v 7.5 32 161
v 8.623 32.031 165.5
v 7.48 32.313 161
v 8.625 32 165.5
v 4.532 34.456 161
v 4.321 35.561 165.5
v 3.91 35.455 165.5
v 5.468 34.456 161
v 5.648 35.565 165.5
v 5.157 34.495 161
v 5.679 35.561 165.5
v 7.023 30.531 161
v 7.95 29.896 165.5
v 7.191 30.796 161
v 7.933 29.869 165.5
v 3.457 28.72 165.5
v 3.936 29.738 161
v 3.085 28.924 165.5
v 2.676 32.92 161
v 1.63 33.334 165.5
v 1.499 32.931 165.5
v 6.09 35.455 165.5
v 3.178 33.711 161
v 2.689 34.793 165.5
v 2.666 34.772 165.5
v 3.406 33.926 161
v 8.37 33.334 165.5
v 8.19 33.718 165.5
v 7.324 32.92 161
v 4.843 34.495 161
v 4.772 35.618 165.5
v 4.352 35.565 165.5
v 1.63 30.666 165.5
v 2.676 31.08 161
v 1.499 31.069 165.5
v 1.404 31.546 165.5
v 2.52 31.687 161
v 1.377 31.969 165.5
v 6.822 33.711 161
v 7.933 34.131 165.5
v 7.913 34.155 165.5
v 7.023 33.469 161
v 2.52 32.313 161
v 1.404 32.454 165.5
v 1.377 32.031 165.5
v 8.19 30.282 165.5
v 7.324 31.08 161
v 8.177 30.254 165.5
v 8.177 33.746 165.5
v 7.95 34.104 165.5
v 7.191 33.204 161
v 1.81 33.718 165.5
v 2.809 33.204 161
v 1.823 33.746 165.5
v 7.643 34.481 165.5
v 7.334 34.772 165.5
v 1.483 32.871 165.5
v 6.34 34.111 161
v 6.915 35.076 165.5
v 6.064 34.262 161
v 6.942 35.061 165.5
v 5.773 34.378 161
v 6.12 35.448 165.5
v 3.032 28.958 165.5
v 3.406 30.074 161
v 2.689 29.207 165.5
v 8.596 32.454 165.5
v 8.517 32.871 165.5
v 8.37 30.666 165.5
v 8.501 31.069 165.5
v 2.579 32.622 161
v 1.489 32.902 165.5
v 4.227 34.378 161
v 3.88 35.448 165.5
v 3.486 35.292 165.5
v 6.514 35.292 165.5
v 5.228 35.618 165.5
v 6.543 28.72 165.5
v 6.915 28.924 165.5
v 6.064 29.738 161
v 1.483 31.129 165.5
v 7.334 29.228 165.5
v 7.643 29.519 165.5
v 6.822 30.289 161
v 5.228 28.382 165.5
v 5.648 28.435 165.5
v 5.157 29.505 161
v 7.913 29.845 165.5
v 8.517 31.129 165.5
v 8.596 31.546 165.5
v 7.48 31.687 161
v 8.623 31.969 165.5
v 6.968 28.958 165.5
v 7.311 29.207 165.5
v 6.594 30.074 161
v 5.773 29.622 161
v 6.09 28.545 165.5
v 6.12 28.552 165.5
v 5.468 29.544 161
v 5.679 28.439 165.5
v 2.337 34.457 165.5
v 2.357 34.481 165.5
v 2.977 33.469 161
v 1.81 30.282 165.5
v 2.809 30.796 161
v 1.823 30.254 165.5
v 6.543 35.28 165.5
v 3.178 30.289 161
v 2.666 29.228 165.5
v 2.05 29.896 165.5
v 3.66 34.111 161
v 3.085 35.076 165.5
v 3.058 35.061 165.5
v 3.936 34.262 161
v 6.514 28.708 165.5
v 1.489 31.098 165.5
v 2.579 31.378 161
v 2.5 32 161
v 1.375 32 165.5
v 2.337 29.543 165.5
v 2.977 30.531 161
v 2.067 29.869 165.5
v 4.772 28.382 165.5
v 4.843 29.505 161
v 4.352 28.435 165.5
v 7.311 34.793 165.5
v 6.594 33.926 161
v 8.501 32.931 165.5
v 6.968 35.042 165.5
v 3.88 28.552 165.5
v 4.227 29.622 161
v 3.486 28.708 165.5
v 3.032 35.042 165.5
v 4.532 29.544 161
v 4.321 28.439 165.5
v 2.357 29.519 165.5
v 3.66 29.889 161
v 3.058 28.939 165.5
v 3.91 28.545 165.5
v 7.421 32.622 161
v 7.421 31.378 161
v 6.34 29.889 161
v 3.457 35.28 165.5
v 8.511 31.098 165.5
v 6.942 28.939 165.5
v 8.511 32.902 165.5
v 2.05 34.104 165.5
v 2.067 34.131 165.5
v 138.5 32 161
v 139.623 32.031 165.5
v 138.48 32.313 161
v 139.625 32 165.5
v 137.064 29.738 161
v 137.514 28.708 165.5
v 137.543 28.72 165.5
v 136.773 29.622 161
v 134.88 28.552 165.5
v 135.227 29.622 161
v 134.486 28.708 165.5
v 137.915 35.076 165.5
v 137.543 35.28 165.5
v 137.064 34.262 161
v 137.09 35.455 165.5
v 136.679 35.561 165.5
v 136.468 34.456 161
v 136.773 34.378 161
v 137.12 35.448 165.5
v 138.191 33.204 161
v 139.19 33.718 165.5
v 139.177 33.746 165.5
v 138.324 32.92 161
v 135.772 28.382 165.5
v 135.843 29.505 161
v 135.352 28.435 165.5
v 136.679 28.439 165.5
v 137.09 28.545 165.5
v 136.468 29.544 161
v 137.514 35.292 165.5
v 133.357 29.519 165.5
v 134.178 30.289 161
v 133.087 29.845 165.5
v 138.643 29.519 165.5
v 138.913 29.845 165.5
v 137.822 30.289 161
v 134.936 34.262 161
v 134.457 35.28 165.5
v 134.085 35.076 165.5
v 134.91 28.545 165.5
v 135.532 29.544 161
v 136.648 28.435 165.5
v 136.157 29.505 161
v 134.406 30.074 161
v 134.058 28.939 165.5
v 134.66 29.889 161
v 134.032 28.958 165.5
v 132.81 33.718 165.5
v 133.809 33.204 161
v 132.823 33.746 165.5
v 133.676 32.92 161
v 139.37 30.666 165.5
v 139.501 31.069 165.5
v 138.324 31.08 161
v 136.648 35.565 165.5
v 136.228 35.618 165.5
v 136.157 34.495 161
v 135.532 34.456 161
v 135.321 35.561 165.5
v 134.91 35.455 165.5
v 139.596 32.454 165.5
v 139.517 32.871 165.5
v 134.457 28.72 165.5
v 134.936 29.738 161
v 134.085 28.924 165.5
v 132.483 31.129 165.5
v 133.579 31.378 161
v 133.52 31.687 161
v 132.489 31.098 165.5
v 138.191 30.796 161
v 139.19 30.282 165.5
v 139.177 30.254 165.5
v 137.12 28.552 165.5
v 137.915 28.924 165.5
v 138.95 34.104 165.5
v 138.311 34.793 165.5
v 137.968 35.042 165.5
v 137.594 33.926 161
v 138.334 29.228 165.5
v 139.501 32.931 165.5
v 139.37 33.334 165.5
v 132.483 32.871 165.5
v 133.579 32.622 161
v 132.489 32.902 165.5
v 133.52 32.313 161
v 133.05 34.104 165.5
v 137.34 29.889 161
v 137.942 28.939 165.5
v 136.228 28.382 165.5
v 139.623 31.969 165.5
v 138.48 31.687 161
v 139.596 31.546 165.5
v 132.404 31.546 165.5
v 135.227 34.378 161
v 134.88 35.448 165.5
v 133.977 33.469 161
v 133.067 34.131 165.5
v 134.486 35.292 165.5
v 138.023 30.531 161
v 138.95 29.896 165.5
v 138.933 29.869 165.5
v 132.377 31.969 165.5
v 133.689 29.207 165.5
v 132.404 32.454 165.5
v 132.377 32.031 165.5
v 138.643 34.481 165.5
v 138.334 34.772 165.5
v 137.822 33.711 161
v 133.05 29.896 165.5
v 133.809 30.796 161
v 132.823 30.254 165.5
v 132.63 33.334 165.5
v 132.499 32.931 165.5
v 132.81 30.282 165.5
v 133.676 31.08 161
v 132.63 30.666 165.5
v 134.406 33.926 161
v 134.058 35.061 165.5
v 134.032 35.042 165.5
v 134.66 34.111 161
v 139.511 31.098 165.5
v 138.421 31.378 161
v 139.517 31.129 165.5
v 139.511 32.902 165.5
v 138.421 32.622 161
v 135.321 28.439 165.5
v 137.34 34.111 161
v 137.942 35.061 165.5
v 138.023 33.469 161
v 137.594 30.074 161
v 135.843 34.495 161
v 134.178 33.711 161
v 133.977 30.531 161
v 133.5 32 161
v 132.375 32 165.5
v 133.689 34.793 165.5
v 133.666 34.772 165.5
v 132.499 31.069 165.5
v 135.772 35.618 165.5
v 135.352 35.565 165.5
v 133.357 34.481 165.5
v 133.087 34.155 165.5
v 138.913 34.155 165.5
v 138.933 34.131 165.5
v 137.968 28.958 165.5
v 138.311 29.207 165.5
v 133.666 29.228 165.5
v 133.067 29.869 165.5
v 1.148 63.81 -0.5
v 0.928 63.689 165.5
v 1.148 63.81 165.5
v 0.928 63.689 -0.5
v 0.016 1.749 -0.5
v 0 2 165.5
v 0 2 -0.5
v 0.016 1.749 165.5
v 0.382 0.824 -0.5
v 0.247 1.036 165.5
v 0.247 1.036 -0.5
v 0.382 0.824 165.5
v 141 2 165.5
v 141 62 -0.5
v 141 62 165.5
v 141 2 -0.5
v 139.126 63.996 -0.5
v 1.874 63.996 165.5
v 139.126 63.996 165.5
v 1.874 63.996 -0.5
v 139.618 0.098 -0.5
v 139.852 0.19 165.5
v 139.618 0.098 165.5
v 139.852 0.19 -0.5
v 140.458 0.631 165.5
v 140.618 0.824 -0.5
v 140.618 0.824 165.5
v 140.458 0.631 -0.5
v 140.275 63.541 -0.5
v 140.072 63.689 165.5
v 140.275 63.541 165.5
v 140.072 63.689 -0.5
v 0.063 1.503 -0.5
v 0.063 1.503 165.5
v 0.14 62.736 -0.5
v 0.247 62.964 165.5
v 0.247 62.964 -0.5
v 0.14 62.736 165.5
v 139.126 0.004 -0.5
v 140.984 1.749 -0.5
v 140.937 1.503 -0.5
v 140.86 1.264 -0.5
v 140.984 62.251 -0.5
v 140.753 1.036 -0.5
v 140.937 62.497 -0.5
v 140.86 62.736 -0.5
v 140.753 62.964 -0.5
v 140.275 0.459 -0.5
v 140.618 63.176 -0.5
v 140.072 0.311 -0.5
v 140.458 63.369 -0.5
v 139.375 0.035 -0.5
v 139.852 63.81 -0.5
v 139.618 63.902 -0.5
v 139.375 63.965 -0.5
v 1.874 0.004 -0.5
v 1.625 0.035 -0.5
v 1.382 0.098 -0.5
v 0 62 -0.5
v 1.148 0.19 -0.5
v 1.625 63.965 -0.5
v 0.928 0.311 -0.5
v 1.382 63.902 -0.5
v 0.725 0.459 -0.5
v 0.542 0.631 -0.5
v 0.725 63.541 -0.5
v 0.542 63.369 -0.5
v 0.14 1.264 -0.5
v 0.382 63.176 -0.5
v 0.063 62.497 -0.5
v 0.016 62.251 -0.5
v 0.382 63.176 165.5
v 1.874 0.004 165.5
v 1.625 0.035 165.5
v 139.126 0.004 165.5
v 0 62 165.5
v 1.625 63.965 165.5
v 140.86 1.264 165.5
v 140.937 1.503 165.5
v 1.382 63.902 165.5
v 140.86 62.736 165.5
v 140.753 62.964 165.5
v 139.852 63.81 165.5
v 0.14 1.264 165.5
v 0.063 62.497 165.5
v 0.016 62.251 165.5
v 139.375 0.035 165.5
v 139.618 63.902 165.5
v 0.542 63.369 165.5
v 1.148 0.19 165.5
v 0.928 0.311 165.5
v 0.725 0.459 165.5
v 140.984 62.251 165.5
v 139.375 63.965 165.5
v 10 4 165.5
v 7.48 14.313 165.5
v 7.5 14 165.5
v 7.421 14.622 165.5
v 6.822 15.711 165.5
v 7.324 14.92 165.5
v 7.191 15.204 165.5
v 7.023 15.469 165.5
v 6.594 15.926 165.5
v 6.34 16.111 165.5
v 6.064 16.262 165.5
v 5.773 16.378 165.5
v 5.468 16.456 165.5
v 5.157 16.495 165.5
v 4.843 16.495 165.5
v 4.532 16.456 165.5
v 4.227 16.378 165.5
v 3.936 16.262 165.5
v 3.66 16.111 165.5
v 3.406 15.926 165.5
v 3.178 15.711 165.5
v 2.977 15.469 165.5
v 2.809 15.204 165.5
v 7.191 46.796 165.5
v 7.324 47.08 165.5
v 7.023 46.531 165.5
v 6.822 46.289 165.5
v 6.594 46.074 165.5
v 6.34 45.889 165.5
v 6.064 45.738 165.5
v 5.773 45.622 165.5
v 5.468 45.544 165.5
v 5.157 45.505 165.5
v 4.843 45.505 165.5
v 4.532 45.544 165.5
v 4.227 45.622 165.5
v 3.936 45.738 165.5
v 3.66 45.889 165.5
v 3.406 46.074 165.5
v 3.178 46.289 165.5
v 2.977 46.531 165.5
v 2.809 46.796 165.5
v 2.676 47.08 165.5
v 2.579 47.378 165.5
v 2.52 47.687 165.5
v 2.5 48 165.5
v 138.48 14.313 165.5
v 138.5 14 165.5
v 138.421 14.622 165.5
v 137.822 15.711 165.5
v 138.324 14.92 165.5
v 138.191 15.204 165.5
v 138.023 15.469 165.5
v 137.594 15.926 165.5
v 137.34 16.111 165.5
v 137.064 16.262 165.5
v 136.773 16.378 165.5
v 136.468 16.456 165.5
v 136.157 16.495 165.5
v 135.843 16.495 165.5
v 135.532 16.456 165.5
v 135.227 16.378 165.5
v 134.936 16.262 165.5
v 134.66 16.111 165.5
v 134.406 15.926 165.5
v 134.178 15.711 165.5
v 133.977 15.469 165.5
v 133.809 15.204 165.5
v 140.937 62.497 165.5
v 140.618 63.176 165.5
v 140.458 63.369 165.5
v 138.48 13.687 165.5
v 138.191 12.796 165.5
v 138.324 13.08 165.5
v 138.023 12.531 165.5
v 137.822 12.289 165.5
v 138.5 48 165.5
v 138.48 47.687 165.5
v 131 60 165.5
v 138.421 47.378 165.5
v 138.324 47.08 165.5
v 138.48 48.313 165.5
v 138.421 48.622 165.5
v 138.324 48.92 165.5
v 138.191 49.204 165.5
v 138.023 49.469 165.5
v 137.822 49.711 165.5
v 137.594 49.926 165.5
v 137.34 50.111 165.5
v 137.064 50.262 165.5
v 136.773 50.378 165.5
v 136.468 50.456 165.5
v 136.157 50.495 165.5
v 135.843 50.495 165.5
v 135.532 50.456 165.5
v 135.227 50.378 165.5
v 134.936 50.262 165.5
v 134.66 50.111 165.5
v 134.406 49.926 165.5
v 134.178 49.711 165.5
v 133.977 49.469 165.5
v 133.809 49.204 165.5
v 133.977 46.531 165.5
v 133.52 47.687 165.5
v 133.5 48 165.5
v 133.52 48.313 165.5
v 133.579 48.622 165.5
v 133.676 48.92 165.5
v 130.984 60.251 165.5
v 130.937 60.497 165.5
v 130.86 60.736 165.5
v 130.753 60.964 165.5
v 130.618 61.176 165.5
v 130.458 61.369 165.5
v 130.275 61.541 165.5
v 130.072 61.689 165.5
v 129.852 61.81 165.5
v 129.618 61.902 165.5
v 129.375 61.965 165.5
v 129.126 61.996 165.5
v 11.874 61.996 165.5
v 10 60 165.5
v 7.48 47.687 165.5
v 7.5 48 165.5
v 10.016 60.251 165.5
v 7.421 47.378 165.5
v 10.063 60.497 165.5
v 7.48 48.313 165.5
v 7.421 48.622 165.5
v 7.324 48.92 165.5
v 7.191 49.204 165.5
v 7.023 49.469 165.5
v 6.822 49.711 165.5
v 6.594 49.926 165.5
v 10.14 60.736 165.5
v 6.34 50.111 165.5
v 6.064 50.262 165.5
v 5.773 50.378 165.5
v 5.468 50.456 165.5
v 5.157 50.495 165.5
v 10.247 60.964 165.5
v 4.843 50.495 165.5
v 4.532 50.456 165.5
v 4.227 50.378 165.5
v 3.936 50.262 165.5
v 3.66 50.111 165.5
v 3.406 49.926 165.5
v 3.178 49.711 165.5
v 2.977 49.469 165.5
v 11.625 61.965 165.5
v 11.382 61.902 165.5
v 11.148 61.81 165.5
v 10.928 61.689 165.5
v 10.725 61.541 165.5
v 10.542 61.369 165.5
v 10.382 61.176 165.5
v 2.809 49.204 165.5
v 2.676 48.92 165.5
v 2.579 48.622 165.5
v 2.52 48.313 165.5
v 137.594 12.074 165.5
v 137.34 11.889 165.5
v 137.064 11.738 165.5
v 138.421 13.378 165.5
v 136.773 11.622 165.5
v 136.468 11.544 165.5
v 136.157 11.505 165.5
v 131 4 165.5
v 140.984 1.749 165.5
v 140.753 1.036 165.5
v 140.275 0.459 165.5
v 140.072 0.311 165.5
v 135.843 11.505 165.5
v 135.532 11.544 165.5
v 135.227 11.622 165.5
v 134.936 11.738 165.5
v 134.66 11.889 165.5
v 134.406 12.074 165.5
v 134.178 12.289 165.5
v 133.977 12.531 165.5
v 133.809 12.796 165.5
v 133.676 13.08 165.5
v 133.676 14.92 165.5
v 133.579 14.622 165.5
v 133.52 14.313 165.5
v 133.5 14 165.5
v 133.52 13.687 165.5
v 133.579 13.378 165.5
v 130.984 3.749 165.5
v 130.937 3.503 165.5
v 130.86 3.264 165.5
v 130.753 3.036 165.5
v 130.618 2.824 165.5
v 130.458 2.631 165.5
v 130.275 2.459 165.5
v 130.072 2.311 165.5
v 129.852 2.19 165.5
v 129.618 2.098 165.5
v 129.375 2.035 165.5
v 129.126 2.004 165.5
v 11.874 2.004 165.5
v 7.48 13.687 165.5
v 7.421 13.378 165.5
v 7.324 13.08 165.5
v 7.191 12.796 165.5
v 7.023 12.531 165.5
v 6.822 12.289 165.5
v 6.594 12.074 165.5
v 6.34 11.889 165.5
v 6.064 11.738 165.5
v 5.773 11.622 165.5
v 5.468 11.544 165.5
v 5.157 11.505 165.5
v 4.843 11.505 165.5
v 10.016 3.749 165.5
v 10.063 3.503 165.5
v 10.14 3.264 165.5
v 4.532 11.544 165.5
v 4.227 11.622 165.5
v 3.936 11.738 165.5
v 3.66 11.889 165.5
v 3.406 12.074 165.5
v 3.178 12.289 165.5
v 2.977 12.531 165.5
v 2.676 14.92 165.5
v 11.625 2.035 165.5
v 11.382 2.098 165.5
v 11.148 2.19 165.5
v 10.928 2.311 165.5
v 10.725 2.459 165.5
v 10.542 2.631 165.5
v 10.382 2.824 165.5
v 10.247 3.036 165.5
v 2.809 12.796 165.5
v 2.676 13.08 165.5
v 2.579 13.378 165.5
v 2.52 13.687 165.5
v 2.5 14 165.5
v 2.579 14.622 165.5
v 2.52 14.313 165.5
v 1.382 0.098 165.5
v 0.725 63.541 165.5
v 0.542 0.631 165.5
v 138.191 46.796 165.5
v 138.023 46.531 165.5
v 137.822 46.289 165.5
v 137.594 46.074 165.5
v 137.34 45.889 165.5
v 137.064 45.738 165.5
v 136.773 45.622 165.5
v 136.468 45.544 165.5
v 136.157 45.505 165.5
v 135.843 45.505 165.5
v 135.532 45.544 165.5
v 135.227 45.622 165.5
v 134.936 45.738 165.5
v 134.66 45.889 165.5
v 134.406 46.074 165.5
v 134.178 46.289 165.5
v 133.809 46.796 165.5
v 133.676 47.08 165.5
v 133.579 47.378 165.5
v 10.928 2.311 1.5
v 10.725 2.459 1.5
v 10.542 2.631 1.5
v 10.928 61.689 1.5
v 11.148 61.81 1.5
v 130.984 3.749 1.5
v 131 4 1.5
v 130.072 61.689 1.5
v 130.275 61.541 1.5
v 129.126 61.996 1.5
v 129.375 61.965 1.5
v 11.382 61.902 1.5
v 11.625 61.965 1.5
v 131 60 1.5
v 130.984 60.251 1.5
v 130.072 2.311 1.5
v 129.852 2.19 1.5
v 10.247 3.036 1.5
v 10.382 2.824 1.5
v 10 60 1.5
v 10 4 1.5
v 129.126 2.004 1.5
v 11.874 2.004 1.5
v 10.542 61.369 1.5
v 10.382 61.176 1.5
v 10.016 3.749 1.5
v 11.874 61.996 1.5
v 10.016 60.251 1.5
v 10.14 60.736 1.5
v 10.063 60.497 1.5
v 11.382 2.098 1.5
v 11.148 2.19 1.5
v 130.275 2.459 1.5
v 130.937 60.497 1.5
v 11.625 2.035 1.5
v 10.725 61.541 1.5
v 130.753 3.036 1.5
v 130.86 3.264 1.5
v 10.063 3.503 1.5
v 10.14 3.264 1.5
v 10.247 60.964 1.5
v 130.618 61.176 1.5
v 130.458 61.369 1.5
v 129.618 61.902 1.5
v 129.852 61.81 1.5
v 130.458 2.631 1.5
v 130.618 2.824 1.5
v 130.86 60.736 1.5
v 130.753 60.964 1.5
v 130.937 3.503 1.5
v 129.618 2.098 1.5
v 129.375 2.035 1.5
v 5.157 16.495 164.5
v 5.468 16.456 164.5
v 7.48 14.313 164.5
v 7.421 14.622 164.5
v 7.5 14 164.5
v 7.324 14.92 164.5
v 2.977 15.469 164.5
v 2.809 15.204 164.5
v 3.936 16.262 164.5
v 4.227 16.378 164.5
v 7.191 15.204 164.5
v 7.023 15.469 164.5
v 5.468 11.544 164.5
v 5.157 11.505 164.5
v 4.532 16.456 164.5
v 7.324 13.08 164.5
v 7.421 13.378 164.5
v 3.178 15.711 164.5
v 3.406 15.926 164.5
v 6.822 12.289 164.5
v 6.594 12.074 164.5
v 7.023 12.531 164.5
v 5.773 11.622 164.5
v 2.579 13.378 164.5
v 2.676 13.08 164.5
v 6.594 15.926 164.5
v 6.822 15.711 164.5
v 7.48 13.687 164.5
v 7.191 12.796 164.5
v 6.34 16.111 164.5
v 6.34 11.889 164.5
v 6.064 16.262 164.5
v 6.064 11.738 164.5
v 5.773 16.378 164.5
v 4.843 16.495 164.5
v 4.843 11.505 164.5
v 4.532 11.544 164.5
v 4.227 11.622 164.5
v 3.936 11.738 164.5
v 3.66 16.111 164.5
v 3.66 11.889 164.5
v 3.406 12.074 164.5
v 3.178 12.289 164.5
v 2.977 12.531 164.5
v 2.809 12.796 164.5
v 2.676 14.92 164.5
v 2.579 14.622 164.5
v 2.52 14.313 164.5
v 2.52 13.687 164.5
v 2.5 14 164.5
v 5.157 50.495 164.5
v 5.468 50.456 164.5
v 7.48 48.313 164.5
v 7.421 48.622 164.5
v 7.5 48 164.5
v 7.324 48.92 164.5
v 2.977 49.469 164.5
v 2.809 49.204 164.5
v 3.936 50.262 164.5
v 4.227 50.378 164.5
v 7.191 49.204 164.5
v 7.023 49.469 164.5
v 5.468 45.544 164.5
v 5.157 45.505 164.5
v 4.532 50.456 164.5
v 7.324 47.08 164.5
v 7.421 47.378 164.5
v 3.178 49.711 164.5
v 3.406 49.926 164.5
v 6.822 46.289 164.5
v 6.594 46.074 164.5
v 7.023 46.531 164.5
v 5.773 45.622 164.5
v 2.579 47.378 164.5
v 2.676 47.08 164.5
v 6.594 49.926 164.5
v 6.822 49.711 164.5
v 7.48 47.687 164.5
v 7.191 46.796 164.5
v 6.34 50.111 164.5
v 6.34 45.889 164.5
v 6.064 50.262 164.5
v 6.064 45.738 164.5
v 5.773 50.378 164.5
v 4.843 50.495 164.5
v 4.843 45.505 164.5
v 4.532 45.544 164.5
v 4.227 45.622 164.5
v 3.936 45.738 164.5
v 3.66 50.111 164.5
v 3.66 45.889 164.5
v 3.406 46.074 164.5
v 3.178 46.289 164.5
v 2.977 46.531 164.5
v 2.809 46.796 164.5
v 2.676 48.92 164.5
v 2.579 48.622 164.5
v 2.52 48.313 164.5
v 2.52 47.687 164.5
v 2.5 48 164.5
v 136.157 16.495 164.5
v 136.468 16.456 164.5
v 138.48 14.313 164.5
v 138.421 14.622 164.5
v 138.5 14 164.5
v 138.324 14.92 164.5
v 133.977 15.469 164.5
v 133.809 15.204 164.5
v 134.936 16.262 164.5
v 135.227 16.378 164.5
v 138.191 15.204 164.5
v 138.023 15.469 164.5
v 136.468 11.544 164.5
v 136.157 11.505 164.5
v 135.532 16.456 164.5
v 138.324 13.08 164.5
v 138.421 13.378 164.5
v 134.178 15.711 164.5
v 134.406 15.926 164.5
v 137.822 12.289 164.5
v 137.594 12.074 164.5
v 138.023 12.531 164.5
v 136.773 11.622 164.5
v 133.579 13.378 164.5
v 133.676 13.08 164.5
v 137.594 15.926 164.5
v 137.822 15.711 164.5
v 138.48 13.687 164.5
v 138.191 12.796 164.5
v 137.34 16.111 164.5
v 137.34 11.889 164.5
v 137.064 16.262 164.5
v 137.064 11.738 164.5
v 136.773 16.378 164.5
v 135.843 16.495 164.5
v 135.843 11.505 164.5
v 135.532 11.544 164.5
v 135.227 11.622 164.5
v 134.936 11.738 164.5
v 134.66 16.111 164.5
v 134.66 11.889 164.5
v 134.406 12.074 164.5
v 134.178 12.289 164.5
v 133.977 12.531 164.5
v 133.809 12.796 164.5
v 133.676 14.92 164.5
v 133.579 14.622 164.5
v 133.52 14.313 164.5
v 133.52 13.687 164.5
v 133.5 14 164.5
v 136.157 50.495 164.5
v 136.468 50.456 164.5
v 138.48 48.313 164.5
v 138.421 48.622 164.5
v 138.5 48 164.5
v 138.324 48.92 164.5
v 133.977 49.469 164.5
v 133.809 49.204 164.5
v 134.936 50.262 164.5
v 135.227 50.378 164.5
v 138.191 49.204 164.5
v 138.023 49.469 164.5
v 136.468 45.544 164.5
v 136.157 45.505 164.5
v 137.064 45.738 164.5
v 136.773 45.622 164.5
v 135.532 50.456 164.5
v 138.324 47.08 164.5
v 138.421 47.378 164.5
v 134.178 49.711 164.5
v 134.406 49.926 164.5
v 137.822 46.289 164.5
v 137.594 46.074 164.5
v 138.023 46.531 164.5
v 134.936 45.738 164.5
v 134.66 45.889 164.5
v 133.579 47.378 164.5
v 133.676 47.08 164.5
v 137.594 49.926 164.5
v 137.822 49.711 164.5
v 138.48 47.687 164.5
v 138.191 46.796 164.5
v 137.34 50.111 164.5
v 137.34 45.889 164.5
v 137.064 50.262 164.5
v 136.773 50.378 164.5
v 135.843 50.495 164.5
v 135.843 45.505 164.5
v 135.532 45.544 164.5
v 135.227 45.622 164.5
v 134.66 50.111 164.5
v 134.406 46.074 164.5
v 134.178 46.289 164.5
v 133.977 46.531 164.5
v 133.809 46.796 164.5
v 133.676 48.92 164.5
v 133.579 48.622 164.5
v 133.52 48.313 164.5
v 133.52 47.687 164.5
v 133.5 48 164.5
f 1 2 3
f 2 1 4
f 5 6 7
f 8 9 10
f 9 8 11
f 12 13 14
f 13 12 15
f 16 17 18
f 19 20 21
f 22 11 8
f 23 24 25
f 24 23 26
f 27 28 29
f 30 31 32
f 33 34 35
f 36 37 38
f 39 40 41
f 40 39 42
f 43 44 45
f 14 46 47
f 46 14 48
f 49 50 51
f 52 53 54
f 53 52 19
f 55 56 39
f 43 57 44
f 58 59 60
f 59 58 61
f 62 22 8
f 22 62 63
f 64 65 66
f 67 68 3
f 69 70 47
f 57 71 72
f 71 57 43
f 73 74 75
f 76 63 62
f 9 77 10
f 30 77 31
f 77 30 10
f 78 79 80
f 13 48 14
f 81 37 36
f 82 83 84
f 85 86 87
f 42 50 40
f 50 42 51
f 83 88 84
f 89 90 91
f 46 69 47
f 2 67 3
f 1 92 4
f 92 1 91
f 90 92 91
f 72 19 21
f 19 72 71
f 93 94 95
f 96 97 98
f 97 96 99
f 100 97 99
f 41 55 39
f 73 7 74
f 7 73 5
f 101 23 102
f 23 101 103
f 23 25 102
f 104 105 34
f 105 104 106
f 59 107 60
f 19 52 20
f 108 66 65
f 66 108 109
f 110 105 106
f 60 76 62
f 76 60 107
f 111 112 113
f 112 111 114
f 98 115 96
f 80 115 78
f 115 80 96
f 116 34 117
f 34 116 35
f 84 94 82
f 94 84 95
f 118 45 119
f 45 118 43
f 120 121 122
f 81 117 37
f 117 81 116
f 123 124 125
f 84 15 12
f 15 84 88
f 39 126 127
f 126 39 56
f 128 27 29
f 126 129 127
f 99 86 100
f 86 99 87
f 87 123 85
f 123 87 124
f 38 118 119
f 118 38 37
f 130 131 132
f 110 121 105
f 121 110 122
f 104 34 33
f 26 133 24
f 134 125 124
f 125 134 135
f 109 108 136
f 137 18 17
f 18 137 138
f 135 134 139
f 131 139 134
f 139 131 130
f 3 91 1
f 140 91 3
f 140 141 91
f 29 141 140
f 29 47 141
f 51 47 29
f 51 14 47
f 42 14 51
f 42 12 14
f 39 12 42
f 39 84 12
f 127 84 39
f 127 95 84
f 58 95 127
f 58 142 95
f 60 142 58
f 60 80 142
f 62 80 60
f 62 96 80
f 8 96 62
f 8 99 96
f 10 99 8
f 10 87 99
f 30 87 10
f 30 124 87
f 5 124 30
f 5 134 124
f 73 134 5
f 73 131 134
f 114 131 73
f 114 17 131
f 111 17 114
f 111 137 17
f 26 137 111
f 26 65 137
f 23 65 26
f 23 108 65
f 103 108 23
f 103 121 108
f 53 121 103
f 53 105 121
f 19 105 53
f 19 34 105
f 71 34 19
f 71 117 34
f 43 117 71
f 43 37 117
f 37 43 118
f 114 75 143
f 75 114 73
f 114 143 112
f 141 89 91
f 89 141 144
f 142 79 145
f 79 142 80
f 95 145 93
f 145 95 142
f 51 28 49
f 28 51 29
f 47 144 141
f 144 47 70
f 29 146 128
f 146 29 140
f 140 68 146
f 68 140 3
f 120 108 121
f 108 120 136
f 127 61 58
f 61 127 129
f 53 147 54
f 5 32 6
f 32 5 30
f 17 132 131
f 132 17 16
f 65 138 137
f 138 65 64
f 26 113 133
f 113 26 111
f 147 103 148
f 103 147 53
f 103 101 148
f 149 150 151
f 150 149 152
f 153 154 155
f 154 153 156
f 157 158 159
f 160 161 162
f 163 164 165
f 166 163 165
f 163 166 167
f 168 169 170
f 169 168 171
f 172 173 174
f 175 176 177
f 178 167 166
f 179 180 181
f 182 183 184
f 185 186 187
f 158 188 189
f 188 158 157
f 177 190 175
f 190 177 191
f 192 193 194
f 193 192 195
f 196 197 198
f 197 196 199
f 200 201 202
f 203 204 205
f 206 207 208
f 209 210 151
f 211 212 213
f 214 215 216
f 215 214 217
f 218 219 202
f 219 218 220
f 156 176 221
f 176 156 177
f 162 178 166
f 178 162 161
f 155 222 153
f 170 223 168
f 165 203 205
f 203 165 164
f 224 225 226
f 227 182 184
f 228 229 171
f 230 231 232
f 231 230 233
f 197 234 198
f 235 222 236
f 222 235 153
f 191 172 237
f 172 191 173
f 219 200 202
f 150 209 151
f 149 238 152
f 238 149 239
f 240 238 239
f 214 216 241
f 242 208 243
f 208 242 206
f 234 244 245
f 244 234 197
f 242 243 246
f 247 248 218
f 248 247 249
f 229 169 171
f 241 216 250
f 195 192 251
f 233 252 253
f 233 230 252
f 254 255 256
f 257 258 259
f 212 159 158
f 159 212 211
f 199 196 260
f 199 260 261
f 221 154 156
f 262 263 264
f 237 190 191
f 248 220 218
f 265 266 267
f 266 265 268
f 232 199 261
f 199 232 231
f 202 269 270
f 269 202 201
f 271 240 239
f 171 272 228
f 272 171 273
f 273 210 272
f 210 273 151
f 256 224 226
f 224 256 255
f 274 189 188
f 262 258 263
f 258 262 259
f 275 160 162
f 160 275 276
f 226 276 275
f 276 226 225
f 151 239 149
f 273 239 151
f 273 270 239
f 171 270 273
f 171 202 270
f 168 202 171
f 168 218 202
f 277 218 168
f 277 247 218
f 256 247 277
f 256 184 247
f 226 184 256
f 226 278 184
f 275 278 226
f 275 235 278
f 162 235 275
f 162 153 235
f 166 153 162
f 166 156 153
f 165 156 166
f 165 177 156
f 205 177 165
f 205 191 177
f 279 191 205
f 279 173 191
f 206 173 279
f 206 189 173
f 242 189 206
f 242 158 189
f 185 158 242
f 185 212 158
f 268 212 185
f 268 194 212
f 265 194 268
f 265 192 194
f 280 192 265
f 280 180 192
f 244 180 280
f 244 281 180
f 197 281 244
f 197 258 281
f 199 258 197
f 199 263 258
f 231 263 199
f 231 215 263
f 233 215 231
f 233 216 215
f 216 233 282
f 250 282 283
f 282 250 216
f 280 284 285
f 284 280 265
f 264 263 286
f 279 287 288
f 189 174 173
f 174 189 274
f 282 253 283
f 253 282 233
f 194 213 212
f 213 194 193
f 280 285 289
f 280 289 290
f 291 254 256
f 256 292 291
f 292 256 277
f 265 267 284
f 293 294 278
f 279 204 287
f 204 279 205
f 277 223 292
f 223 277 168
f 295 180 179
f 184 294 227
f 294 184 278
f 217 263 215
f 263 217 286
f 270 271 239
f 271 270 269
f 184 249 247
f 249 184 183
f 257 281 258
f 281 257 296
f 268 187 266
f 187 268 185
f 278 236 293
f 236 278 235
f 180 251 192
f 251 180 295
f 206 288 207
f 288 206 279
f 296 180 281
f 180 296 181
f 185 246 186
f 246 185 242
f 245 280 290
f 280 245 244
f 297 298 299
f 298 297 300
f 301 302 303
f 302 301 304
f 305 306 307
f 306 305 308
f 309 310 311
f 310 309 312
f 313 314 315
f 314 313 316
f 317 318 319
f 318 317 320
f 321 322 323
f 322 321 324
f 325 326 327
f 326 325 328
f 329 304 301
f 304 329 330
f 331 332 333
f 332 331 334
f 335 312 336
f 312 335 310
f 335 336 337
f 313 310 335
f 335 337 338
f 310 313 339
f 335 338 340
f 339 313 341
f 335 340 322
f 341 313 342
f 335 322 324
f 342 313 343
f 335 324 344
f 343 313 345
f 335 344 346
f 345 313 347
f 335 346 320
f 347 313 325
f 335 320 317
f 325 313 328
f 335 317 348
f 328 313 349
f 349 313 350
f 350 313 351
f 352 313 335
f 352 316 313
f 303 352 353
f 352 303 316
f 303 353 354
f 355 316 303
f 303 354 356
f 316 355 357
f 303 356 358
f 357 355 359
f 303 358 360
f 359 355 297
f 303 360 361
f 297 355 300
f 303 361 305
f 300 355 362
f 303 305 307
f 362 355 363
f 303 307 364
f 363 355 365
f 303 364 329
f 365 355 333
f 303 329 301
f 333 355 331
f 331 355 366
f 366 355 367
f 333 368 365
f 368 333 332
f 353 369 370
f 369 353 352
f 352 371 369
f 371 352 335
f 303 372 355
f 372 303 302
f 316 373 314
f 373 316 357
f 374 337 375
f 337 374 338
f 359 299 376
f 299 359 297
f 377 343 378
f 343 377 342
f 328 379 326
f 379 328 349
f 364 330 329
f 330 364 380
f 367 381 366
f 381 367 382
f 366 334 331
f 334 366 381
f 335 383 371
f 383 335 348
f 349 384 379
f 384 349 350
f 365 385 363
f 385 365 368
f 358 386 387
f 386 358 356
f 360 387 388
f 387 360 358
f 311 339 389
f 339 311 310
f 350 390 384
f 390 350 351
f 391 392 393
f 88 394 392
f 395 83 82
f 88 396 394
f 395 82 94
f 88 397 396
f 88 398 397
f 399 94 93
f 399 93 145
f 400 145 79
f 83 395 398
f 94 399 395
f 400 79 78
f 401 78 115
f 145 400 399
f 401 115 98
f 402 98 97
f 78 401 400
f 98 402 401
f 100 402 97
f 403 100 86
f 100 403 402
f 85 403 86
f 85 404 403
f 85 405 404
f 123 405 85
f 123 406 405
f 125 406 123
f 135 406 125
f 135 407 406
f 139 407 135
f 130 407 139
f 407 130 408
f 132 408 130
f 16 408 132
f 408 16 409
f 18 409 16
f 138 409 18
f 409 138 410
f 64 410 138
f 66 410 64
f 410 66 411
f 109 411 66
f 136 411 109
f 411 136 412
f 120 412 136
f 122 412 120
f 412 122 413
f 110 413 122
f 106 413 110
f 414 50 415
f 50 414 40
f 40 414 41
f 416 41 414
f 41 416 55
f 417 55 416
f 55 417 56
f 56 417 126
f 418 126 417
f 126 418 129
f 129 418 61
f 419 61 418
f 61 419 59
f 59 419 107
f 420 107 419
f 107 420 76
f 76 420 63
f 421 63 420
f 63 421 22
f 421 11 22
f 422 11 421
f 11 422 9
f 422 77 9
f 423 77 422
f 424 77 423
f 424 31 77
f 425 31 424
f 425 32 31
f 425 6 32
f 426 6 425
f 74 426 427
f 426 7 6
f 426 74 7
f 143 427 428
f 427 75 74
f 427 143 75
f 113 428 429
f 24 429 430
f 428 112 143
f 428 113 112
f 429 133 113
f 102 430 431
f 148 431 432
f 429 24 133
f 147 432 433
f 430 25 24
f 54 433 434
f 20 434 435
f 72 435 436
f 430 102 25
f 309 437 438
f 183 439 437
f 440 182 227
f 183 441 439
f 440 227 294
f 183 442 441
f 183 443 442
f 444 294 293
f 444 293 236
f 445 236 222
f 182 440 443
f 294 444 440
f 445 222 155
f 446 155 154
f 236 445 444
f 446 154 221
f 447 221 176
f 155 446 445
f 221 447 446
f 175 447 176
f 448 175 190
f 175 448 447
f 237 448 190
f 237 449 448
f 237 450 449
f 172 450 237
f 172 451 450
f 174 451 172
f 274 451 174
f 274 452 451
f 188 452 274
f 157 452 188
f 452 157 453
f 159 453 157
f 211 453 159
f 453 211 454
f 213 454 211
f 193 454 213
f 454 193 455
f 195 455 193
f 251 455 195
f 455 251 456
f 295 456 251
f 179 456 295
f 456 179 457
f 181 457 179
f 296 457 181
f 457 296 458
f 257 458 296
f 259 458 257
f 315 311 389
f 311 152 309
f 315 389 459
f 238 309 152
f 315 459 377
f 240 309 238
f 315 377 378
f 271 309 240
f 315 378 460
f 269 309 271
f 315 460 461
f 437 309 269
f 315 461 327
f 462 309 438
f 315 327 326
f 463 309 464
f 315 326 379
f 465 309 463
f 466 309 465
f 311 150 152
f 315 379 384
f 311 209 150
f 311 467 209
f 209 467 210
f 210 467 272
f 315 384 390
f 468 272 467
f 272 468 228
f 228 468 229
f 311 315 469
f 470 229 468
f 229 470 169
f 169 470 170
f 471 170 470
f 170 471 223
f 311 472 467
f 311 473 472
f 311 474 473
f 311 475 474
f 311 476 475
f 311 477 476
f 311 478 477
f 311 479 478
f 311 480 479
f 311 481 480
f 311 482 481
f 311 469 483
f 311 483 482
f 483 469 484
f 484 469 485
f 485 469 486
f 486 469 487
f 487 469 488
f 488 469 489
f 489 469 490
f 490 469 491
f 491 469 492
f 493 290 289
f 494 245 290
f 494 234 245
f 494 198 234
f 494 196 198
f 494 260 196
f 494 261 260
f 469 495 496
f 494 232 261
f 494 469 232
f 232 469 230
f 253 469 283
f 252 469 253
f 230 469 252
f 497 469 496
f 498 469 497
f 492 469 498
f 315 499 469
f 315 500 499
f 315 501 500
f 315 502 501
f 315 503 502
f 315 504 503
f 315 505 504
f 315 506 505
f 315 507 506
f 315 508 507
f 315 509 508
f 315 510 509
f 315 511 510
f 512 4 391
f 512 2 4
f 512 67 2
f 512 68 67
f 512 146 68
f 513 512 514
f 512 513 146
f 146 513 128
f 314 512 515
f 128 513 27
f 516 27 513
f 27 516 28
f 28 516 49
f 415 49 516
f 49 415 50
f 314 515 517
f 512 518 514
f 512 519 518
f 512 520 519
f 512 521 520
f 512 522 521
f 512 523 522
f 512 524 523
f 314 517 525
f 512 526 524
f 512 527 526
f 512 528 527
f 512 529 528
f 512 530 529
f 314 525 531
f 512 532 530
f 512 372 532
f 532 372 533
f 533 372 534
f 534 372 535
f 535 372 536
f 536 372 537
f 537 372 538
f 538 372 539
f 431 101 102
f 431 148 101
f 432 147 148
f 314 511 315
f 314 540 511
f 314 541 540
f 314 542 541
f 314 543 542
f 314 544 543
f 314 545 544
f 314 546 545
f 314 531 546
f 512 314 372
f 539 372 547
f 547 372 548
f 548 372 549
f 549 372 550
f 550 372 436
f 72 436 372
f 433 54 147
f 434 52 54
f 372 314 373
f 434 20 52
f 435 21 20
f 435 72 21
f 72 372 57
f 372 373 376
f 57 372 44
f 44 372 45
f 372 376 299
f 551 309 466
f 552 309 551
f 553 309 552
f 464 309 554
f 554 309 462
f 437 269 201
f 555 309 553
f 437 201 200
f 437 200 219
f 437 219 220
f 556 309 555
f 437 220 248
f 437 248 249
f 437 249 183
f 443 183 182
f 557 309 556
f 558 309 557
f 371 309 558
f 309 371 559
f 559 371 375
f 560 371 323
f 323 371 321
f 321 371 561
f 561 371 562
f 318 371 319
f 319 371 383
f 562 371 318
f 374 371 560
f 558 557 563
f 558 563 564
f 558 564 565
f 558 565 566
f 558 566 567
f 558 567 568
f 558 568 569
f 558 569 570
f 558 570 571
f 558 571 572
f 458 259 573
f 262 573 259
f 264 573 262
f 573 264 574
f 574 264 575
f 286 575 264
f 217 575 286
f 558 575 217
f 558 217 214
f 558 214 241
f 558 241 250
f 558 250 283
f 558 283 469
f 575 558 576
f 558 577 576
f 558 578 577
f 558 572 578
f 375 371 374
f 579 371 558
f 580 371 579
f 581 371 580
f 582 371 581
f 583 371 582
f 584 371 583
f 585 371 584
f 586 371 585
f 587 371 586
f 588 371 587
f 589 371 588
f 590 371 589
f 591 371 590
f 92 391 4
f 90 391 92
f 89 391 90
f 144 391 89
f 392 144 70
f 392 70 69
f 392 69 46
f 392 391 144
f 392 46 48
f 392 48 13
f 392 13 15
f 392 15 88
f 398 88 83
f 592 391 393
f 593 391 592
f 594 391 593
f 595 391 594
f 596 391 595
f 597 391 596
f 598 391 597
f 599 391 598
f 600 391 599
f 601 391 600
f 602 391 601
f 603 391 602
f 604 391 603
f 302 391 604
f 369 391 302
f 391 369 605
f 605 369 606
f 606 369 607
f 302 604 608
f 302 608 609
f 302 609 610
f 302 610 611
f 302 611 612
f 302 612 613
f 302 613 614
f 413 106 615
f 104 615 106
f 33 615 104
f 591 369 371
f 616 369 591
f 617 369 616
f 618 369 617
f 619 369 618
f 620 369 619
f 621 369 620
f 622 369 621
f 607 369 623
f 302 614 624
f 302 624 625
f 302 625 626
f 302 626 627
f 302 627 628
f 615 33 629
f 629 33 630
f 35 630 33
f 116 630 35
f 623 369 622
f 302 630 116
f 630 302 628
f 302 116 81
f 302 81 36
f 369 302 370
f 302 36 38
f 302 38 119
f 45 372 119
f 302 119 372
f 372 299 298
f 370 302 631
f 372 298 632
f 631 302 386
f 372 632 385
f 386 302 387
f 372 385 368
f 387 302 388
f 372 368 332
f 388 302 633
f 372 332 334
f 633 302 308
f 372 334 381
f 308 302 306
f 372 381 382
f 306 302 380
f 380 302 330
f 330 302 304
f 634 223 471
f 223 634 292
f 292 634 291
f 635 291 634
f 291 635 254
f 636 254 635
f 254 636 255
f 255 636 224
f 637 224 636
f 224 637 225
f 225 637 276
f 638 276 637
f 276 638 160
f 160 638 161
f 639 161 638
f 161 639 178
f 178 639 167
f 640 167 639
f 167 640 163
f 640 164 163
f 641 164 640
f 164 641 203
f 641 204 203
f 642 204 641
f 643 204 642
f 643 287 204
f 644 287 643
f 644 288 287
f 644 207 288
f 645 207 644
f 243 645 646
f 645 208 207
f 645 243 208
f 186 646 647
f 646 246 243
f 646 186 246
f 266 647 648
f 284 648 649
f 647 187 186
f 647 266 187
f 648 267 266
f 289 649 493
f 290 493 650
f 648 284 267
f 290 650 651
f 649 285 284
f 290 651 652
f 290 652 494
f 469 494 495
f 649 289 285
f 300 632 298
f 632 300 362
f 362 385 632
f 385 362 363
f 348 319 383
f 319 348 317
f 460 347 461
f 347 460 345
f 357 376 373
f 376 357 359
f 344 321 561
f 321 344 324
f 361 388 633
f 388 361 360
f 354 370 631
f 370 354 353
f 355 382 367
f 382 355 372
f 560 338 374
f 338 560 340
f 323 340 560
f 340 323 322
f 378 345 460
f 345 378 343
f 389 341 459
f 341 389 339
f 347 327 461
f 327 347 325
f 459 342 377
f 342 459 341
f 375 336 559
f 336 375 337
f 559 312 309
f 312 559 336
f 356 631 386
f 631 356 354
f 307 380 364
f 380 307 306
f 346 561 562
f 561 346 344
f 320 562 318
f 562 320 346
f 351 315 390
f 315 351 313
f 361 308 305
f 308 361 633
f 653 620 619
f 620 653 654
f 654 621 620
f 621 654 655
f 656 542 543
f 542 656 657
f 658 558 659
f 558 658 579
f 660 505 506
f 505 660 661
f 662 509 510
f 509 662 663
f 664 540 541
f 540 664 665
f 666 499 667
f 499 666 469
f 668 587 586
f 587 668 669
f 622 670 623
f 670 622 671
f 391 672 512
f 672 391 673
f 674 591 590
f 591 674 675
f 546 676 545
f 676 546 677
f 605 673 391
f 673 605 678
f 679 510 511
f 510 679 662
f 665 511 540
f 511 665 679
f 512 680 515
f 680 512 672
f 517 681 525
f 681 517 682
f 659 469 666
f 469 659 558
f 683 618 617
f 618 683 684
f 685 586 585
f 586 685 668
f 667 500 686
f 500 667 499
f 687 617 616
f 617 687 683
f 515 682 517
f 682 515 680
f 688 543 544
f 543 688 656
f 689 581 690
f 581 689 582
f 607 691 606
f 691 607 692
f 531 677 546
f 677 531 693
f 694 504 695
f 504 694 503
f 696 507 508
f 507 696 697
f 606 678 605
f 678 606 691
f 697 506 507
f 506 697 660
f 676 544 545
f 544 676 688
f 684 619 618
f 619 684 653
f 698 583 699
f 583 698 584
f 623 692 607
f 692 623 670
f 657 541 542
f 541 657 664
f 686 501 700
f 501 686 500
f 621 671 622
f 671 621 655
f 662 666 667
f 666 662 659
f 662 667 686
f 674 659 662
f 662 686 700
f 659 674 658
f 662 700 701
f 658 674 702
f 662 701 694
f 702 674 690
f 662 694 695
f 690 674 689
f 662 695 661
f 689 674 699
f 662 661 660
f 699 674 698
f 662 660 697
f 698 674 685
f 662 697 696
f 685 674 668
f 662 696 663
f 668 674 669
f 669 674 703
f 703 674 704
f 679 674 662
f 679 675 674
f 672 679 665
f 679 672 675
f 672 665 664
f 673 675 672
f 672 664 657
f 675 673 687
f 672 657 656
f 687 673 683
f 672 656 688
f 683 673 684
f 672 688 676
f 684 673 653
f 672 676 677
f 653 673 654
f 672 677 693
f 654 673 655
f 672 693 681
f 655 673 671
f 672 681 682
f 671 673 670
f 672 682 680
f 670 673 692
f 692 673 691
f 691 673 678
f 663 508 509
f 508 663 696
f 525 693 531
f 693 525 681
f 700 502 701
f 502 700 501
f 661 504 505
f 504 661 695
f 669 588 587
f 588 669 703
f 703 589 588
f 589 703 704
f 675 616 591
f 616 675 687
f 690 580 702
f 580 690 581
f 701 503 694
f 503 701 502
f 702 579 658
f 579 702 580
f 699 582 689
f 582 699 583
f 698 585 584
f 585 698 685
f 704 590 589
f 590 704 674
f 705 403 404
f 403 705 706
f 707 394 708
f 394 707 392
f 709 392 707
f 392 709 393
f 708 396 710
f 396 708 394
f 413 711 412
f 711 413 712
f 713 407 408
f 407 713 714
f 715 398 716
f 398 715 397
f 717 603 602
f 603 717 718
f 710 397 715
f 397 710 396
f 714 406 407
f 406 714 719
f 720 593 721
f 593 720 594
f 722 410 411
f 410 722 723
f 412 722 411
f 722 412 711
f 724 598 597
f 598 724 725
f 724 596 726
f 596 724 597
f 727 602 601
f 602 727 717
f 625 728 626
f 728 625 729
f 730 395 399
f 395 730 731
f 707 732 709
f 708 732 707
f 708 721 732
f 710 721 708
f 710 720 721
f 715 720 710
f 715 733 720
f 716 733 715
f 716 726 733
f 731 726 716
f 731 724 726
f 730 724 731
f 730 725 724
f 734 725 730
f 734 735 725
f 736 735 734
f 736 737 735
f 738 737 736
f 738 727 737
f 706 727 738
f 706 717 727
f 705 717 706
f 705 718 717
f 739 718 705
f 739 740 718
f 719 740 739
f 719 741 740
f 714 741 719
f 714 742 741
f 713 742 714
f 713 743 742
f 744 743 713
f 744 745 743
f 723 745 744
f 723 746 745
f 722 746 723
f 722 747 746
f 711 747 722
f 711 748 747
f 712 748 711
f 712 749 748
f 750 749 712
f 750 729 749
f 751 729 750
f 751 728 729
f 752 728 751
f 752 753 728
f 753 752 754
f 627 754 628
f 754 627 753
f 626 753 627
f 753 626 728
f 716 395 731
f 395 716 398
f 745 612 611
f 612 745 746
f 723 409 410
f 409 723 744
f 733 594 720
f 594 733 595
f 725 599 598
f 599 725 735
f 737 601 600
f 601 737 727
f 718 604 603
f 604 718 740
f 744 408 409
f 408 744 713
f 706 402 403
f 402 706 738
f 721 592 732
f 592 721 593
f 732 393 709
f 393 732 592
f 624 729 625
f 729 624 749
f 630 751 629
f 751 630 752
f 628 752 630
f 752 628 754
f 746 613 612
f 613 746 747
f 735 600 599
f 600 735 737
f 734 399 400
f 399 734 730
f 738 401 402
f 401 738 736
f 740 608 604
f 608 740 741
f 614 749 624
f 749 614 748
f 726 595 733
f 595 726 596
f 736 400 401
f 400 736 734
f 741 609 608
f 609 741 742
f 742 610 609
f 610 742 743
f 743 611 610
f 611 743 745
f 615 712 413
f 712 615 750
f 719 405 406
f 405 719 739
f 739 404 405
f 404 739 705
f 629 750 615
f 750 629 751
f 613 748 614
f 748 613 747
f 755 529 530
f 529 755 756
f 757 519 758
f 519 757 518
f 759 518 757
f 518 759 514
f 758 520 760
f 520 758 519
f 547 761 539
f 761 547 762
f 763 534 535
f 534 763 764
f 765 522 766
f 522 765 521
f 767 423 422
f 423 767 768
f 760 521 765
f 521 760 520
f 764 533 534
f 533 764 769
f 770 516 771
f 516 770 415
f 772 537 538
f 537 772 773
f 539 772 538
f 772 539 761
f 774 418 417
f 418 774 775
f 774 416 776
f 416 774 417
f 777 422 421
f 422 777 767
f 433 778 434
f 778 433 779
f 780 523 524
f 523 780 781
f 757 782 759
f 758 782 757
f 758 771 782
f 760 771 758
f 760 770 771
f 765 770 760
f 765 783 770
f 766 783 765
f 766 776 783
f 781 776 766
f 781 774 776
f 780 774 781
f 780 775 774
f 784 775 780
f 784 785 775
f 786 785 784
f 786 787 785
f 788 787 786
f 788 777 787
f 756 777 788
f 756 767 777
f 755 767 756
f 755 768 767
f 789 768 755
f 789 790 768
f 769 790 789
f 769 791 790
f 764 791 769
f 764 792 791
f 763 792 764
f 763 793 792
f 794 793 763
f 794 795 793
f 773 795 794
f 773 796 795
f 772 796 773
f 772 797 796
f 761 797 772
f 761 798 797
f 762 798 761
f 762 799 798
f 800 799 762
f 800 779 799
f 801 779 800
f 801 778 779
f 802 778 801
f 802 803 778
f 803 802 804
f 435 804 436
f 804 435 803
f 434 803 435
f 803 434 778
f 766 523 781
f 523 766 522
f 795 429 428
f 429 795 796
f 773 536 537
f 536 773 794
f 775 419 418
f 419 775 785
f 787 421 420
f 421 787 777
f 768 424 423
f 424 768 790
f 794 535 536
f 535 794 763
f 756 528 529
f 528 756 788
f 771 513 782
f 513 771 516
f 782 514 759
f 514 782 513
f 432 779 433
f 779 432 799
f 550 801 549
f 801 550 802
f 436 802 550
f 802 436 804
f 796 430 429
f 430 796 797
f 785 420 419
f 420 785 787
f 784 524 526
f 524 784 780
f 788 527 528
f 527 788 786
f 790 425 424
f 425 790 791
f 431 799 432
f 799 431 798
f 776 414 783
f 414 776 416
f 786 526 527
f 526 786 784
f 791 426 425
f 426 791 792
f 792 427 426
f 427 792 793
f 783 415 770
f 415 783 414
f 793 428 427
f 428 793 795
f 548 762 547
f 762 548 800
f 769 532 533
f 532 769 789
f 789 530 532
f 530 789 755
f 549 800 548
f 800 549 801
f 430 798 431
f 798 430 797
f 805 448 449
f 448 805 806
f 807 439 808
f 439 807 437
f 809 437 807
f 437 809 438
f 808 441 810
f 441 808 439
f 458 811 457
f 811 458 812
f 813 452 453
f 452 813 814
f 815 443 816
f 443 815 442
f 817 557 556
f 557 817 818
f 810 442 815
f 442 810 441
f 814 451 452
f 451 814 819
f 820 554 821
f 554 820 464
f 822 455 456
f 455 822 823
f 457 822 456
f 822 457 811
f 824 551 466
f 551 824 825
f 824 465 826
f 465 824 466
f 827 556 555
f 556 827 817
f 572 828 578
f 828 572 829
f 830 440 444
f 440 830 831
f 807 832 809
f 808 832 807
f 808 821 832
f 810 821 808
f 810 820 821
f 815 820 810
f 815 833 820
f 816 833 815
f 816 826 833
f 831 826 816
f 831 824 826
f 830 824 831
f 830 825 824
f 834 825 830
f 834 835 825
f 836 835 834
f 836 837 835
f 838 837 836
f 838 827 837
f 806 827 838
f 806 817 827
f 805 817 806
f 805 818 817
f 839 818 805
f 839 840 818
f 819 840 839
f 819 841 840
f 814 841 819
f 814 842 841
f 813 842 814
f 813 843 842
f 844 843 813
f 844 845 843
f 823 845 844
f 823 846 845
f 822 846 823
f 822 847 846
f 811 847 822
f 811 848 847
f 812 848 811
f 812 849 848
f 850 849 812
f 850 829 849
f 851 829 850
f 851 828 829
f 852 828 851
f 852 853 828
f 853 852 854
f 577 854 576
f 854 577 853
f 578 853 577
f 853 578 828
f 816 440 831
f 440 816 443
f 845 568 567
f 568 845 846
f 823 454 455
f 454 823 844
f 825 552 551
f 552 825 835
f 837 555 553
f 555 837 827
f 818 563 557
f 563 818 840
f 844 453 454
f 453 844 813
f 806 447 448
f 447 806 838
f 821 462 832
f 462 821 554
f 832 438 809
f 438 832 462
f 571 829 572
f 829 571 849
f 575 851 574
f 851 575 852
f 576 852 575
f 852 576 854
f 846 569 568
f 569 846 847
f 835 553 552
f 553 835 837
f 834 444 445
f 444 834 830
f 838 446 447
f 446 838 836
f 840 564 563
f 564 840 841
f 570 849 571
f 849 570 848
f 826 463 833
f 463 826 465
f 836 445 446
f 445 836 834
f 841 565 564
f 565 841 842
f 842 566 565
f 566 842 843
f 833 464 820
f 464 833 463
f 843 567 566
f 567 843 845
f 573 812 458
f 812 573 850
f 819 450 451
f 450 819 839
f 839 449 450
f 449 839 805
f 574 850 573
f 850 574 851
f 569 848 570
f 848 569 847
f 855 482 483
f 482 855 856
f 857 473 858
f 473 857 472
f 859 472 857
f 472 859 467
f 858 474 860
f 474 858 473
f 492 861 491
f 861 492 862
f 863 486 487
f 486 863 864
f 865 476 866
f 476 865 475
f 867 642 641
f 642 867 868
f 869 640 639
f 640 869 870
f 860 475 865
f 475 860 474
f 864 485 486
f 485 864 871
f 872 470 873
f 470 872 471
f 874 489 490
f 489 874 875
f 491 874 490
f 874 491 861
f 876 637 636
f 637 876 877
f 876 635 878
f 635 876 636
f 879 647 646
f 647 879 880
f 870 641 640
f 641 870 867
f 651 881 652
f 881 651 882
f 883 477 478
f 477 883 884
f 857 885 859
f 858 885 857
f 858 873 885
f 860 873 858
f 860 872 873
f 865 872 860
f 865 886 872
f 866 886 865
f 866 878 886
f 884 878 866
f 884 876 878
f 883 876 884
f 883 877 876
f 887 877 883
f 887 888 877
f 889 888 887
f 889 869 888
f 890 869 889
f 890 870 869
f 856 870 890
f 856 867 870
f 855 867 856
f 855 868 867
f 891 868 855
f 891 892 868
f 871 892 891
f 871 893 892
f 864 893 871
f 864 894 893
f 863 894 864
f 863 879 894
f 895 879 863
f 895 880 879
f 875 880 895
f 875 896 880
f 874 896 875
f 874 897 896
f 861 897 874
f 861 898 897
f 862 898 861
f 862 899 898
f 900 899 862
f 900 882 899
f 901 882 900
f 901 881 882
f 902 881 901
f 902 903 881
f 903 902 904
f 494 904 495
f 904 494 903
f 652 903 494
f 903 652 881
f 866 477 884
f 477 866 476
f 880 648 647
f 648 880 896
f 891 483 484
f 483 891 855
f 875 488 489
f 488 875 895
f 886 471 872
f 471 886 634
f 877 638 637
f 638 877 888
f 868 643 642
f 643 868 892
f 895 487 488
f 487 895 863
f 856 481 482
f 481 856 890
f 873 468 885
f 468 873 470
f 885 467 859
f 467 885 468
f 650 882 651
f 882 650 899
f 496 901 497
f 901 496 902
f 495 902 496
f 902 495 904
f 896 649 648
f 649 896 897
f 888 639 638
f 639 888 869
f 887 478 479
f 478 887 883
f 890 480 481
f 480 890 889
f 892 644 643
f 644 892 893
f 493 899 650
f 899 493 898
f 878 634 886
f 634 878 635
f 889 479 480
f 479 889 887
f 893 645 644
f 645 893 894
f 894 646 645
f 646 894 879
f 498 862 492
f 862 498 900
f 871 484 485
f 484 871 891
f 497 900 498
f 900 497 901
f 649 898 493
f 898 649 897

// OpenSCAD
/* keebCase.scad
Author: andimoto@posteo.de
----------------------------
for placing assambled parts and
single parts go to end of this file
 */

$fn=50;

keebLen = 330;
keebThickness = 56;
keebHeight = 117;
wallThickness = 2;
sideThickness = 10;
edgeRadius = 2;

magnetRadius = 5/2;
magnetThickness = 1;

module halfCase(slidePin = false)
{
  difference() {
    minkowski()
    {
      cube([keebHeight+sideThickness*2,
          keebThickness+wallThickness*2,
          keebLen/2]);
      cylinder(r=edgeRadius, center=true);
    }

    translate([sideThickness,wallThickness,wallThickness])
    minkowski()
    {
      cube([keebHeight,
          keebThickness,
          keebLen/2-wallThickness]);
      cylinder(r=edgeRadius, center=true);
    }

    translate([sideThickness/2-edgeRadius, keebThickness/4-edgeRadius,keebLen/2])
    cylinder(r=magnetRadius, h=magnetThickness, center=true);
    translate([sideThickness/2-edgeRadius,(keebThickness+edgeRadius*2)-keebThickness/4,keebLen/2])
    cylinder(r=magnetRadius, h=magnetThickness, center=true);

    translate([keebHeight+sideThickness*2-sideThickness/2+edgeRadius, keebThickness/4-edgeRadius,keebLen/2])
    cylinder(r=magnetRadius, h=magnetThickness, center=true);
    translate([keebHeight+sideThickness*2-sideThickness/2+edgeRadius,(keebThickness+edgeRadius*2)-keebThickness/4,keebLen/2])
    cylinder(r=magnetRadius, h=magnetThickness, center=true);

    if(slidePin == false)
    {
      translate([sideThickness/2-edgeRadius,(keebThickness+edgeRadius*2)/2,keebLen/2-4])
      cylinder(r1=magnetRadius,r2=magnetRadius*1.5, h=5, center=false);

      translate([keebHeight+sideThickness*2-sideThickness/2+edgeRadius,(keebThickness+edgeRadius*2)/2,keebLen/2-4])
      cylinder(r1=magnetRadius,r2=magnetRadius*1.5, h=5, center=false);
    }

  }

  if(slidePin == true)
  {
    translate([sideThickness/2-edgeRadius,(keebThickness+edgeRadius*2)/2,keebLen/2])
    cylinder(r1=magnetRadius*1.5,r2=magnetRadius, h=5, center=false);

    translate([keebHeight+sideThickness*2-sideThickness/2+edgeRadius,(keebThickness+edgeRadius*2)/2,keebLen/2])
    cylinder(r1=magnetRadius*1.5,r2=magnetRadius, h=5, center=false);
  }
}

translate([2,2,0]) halfCase(false);
